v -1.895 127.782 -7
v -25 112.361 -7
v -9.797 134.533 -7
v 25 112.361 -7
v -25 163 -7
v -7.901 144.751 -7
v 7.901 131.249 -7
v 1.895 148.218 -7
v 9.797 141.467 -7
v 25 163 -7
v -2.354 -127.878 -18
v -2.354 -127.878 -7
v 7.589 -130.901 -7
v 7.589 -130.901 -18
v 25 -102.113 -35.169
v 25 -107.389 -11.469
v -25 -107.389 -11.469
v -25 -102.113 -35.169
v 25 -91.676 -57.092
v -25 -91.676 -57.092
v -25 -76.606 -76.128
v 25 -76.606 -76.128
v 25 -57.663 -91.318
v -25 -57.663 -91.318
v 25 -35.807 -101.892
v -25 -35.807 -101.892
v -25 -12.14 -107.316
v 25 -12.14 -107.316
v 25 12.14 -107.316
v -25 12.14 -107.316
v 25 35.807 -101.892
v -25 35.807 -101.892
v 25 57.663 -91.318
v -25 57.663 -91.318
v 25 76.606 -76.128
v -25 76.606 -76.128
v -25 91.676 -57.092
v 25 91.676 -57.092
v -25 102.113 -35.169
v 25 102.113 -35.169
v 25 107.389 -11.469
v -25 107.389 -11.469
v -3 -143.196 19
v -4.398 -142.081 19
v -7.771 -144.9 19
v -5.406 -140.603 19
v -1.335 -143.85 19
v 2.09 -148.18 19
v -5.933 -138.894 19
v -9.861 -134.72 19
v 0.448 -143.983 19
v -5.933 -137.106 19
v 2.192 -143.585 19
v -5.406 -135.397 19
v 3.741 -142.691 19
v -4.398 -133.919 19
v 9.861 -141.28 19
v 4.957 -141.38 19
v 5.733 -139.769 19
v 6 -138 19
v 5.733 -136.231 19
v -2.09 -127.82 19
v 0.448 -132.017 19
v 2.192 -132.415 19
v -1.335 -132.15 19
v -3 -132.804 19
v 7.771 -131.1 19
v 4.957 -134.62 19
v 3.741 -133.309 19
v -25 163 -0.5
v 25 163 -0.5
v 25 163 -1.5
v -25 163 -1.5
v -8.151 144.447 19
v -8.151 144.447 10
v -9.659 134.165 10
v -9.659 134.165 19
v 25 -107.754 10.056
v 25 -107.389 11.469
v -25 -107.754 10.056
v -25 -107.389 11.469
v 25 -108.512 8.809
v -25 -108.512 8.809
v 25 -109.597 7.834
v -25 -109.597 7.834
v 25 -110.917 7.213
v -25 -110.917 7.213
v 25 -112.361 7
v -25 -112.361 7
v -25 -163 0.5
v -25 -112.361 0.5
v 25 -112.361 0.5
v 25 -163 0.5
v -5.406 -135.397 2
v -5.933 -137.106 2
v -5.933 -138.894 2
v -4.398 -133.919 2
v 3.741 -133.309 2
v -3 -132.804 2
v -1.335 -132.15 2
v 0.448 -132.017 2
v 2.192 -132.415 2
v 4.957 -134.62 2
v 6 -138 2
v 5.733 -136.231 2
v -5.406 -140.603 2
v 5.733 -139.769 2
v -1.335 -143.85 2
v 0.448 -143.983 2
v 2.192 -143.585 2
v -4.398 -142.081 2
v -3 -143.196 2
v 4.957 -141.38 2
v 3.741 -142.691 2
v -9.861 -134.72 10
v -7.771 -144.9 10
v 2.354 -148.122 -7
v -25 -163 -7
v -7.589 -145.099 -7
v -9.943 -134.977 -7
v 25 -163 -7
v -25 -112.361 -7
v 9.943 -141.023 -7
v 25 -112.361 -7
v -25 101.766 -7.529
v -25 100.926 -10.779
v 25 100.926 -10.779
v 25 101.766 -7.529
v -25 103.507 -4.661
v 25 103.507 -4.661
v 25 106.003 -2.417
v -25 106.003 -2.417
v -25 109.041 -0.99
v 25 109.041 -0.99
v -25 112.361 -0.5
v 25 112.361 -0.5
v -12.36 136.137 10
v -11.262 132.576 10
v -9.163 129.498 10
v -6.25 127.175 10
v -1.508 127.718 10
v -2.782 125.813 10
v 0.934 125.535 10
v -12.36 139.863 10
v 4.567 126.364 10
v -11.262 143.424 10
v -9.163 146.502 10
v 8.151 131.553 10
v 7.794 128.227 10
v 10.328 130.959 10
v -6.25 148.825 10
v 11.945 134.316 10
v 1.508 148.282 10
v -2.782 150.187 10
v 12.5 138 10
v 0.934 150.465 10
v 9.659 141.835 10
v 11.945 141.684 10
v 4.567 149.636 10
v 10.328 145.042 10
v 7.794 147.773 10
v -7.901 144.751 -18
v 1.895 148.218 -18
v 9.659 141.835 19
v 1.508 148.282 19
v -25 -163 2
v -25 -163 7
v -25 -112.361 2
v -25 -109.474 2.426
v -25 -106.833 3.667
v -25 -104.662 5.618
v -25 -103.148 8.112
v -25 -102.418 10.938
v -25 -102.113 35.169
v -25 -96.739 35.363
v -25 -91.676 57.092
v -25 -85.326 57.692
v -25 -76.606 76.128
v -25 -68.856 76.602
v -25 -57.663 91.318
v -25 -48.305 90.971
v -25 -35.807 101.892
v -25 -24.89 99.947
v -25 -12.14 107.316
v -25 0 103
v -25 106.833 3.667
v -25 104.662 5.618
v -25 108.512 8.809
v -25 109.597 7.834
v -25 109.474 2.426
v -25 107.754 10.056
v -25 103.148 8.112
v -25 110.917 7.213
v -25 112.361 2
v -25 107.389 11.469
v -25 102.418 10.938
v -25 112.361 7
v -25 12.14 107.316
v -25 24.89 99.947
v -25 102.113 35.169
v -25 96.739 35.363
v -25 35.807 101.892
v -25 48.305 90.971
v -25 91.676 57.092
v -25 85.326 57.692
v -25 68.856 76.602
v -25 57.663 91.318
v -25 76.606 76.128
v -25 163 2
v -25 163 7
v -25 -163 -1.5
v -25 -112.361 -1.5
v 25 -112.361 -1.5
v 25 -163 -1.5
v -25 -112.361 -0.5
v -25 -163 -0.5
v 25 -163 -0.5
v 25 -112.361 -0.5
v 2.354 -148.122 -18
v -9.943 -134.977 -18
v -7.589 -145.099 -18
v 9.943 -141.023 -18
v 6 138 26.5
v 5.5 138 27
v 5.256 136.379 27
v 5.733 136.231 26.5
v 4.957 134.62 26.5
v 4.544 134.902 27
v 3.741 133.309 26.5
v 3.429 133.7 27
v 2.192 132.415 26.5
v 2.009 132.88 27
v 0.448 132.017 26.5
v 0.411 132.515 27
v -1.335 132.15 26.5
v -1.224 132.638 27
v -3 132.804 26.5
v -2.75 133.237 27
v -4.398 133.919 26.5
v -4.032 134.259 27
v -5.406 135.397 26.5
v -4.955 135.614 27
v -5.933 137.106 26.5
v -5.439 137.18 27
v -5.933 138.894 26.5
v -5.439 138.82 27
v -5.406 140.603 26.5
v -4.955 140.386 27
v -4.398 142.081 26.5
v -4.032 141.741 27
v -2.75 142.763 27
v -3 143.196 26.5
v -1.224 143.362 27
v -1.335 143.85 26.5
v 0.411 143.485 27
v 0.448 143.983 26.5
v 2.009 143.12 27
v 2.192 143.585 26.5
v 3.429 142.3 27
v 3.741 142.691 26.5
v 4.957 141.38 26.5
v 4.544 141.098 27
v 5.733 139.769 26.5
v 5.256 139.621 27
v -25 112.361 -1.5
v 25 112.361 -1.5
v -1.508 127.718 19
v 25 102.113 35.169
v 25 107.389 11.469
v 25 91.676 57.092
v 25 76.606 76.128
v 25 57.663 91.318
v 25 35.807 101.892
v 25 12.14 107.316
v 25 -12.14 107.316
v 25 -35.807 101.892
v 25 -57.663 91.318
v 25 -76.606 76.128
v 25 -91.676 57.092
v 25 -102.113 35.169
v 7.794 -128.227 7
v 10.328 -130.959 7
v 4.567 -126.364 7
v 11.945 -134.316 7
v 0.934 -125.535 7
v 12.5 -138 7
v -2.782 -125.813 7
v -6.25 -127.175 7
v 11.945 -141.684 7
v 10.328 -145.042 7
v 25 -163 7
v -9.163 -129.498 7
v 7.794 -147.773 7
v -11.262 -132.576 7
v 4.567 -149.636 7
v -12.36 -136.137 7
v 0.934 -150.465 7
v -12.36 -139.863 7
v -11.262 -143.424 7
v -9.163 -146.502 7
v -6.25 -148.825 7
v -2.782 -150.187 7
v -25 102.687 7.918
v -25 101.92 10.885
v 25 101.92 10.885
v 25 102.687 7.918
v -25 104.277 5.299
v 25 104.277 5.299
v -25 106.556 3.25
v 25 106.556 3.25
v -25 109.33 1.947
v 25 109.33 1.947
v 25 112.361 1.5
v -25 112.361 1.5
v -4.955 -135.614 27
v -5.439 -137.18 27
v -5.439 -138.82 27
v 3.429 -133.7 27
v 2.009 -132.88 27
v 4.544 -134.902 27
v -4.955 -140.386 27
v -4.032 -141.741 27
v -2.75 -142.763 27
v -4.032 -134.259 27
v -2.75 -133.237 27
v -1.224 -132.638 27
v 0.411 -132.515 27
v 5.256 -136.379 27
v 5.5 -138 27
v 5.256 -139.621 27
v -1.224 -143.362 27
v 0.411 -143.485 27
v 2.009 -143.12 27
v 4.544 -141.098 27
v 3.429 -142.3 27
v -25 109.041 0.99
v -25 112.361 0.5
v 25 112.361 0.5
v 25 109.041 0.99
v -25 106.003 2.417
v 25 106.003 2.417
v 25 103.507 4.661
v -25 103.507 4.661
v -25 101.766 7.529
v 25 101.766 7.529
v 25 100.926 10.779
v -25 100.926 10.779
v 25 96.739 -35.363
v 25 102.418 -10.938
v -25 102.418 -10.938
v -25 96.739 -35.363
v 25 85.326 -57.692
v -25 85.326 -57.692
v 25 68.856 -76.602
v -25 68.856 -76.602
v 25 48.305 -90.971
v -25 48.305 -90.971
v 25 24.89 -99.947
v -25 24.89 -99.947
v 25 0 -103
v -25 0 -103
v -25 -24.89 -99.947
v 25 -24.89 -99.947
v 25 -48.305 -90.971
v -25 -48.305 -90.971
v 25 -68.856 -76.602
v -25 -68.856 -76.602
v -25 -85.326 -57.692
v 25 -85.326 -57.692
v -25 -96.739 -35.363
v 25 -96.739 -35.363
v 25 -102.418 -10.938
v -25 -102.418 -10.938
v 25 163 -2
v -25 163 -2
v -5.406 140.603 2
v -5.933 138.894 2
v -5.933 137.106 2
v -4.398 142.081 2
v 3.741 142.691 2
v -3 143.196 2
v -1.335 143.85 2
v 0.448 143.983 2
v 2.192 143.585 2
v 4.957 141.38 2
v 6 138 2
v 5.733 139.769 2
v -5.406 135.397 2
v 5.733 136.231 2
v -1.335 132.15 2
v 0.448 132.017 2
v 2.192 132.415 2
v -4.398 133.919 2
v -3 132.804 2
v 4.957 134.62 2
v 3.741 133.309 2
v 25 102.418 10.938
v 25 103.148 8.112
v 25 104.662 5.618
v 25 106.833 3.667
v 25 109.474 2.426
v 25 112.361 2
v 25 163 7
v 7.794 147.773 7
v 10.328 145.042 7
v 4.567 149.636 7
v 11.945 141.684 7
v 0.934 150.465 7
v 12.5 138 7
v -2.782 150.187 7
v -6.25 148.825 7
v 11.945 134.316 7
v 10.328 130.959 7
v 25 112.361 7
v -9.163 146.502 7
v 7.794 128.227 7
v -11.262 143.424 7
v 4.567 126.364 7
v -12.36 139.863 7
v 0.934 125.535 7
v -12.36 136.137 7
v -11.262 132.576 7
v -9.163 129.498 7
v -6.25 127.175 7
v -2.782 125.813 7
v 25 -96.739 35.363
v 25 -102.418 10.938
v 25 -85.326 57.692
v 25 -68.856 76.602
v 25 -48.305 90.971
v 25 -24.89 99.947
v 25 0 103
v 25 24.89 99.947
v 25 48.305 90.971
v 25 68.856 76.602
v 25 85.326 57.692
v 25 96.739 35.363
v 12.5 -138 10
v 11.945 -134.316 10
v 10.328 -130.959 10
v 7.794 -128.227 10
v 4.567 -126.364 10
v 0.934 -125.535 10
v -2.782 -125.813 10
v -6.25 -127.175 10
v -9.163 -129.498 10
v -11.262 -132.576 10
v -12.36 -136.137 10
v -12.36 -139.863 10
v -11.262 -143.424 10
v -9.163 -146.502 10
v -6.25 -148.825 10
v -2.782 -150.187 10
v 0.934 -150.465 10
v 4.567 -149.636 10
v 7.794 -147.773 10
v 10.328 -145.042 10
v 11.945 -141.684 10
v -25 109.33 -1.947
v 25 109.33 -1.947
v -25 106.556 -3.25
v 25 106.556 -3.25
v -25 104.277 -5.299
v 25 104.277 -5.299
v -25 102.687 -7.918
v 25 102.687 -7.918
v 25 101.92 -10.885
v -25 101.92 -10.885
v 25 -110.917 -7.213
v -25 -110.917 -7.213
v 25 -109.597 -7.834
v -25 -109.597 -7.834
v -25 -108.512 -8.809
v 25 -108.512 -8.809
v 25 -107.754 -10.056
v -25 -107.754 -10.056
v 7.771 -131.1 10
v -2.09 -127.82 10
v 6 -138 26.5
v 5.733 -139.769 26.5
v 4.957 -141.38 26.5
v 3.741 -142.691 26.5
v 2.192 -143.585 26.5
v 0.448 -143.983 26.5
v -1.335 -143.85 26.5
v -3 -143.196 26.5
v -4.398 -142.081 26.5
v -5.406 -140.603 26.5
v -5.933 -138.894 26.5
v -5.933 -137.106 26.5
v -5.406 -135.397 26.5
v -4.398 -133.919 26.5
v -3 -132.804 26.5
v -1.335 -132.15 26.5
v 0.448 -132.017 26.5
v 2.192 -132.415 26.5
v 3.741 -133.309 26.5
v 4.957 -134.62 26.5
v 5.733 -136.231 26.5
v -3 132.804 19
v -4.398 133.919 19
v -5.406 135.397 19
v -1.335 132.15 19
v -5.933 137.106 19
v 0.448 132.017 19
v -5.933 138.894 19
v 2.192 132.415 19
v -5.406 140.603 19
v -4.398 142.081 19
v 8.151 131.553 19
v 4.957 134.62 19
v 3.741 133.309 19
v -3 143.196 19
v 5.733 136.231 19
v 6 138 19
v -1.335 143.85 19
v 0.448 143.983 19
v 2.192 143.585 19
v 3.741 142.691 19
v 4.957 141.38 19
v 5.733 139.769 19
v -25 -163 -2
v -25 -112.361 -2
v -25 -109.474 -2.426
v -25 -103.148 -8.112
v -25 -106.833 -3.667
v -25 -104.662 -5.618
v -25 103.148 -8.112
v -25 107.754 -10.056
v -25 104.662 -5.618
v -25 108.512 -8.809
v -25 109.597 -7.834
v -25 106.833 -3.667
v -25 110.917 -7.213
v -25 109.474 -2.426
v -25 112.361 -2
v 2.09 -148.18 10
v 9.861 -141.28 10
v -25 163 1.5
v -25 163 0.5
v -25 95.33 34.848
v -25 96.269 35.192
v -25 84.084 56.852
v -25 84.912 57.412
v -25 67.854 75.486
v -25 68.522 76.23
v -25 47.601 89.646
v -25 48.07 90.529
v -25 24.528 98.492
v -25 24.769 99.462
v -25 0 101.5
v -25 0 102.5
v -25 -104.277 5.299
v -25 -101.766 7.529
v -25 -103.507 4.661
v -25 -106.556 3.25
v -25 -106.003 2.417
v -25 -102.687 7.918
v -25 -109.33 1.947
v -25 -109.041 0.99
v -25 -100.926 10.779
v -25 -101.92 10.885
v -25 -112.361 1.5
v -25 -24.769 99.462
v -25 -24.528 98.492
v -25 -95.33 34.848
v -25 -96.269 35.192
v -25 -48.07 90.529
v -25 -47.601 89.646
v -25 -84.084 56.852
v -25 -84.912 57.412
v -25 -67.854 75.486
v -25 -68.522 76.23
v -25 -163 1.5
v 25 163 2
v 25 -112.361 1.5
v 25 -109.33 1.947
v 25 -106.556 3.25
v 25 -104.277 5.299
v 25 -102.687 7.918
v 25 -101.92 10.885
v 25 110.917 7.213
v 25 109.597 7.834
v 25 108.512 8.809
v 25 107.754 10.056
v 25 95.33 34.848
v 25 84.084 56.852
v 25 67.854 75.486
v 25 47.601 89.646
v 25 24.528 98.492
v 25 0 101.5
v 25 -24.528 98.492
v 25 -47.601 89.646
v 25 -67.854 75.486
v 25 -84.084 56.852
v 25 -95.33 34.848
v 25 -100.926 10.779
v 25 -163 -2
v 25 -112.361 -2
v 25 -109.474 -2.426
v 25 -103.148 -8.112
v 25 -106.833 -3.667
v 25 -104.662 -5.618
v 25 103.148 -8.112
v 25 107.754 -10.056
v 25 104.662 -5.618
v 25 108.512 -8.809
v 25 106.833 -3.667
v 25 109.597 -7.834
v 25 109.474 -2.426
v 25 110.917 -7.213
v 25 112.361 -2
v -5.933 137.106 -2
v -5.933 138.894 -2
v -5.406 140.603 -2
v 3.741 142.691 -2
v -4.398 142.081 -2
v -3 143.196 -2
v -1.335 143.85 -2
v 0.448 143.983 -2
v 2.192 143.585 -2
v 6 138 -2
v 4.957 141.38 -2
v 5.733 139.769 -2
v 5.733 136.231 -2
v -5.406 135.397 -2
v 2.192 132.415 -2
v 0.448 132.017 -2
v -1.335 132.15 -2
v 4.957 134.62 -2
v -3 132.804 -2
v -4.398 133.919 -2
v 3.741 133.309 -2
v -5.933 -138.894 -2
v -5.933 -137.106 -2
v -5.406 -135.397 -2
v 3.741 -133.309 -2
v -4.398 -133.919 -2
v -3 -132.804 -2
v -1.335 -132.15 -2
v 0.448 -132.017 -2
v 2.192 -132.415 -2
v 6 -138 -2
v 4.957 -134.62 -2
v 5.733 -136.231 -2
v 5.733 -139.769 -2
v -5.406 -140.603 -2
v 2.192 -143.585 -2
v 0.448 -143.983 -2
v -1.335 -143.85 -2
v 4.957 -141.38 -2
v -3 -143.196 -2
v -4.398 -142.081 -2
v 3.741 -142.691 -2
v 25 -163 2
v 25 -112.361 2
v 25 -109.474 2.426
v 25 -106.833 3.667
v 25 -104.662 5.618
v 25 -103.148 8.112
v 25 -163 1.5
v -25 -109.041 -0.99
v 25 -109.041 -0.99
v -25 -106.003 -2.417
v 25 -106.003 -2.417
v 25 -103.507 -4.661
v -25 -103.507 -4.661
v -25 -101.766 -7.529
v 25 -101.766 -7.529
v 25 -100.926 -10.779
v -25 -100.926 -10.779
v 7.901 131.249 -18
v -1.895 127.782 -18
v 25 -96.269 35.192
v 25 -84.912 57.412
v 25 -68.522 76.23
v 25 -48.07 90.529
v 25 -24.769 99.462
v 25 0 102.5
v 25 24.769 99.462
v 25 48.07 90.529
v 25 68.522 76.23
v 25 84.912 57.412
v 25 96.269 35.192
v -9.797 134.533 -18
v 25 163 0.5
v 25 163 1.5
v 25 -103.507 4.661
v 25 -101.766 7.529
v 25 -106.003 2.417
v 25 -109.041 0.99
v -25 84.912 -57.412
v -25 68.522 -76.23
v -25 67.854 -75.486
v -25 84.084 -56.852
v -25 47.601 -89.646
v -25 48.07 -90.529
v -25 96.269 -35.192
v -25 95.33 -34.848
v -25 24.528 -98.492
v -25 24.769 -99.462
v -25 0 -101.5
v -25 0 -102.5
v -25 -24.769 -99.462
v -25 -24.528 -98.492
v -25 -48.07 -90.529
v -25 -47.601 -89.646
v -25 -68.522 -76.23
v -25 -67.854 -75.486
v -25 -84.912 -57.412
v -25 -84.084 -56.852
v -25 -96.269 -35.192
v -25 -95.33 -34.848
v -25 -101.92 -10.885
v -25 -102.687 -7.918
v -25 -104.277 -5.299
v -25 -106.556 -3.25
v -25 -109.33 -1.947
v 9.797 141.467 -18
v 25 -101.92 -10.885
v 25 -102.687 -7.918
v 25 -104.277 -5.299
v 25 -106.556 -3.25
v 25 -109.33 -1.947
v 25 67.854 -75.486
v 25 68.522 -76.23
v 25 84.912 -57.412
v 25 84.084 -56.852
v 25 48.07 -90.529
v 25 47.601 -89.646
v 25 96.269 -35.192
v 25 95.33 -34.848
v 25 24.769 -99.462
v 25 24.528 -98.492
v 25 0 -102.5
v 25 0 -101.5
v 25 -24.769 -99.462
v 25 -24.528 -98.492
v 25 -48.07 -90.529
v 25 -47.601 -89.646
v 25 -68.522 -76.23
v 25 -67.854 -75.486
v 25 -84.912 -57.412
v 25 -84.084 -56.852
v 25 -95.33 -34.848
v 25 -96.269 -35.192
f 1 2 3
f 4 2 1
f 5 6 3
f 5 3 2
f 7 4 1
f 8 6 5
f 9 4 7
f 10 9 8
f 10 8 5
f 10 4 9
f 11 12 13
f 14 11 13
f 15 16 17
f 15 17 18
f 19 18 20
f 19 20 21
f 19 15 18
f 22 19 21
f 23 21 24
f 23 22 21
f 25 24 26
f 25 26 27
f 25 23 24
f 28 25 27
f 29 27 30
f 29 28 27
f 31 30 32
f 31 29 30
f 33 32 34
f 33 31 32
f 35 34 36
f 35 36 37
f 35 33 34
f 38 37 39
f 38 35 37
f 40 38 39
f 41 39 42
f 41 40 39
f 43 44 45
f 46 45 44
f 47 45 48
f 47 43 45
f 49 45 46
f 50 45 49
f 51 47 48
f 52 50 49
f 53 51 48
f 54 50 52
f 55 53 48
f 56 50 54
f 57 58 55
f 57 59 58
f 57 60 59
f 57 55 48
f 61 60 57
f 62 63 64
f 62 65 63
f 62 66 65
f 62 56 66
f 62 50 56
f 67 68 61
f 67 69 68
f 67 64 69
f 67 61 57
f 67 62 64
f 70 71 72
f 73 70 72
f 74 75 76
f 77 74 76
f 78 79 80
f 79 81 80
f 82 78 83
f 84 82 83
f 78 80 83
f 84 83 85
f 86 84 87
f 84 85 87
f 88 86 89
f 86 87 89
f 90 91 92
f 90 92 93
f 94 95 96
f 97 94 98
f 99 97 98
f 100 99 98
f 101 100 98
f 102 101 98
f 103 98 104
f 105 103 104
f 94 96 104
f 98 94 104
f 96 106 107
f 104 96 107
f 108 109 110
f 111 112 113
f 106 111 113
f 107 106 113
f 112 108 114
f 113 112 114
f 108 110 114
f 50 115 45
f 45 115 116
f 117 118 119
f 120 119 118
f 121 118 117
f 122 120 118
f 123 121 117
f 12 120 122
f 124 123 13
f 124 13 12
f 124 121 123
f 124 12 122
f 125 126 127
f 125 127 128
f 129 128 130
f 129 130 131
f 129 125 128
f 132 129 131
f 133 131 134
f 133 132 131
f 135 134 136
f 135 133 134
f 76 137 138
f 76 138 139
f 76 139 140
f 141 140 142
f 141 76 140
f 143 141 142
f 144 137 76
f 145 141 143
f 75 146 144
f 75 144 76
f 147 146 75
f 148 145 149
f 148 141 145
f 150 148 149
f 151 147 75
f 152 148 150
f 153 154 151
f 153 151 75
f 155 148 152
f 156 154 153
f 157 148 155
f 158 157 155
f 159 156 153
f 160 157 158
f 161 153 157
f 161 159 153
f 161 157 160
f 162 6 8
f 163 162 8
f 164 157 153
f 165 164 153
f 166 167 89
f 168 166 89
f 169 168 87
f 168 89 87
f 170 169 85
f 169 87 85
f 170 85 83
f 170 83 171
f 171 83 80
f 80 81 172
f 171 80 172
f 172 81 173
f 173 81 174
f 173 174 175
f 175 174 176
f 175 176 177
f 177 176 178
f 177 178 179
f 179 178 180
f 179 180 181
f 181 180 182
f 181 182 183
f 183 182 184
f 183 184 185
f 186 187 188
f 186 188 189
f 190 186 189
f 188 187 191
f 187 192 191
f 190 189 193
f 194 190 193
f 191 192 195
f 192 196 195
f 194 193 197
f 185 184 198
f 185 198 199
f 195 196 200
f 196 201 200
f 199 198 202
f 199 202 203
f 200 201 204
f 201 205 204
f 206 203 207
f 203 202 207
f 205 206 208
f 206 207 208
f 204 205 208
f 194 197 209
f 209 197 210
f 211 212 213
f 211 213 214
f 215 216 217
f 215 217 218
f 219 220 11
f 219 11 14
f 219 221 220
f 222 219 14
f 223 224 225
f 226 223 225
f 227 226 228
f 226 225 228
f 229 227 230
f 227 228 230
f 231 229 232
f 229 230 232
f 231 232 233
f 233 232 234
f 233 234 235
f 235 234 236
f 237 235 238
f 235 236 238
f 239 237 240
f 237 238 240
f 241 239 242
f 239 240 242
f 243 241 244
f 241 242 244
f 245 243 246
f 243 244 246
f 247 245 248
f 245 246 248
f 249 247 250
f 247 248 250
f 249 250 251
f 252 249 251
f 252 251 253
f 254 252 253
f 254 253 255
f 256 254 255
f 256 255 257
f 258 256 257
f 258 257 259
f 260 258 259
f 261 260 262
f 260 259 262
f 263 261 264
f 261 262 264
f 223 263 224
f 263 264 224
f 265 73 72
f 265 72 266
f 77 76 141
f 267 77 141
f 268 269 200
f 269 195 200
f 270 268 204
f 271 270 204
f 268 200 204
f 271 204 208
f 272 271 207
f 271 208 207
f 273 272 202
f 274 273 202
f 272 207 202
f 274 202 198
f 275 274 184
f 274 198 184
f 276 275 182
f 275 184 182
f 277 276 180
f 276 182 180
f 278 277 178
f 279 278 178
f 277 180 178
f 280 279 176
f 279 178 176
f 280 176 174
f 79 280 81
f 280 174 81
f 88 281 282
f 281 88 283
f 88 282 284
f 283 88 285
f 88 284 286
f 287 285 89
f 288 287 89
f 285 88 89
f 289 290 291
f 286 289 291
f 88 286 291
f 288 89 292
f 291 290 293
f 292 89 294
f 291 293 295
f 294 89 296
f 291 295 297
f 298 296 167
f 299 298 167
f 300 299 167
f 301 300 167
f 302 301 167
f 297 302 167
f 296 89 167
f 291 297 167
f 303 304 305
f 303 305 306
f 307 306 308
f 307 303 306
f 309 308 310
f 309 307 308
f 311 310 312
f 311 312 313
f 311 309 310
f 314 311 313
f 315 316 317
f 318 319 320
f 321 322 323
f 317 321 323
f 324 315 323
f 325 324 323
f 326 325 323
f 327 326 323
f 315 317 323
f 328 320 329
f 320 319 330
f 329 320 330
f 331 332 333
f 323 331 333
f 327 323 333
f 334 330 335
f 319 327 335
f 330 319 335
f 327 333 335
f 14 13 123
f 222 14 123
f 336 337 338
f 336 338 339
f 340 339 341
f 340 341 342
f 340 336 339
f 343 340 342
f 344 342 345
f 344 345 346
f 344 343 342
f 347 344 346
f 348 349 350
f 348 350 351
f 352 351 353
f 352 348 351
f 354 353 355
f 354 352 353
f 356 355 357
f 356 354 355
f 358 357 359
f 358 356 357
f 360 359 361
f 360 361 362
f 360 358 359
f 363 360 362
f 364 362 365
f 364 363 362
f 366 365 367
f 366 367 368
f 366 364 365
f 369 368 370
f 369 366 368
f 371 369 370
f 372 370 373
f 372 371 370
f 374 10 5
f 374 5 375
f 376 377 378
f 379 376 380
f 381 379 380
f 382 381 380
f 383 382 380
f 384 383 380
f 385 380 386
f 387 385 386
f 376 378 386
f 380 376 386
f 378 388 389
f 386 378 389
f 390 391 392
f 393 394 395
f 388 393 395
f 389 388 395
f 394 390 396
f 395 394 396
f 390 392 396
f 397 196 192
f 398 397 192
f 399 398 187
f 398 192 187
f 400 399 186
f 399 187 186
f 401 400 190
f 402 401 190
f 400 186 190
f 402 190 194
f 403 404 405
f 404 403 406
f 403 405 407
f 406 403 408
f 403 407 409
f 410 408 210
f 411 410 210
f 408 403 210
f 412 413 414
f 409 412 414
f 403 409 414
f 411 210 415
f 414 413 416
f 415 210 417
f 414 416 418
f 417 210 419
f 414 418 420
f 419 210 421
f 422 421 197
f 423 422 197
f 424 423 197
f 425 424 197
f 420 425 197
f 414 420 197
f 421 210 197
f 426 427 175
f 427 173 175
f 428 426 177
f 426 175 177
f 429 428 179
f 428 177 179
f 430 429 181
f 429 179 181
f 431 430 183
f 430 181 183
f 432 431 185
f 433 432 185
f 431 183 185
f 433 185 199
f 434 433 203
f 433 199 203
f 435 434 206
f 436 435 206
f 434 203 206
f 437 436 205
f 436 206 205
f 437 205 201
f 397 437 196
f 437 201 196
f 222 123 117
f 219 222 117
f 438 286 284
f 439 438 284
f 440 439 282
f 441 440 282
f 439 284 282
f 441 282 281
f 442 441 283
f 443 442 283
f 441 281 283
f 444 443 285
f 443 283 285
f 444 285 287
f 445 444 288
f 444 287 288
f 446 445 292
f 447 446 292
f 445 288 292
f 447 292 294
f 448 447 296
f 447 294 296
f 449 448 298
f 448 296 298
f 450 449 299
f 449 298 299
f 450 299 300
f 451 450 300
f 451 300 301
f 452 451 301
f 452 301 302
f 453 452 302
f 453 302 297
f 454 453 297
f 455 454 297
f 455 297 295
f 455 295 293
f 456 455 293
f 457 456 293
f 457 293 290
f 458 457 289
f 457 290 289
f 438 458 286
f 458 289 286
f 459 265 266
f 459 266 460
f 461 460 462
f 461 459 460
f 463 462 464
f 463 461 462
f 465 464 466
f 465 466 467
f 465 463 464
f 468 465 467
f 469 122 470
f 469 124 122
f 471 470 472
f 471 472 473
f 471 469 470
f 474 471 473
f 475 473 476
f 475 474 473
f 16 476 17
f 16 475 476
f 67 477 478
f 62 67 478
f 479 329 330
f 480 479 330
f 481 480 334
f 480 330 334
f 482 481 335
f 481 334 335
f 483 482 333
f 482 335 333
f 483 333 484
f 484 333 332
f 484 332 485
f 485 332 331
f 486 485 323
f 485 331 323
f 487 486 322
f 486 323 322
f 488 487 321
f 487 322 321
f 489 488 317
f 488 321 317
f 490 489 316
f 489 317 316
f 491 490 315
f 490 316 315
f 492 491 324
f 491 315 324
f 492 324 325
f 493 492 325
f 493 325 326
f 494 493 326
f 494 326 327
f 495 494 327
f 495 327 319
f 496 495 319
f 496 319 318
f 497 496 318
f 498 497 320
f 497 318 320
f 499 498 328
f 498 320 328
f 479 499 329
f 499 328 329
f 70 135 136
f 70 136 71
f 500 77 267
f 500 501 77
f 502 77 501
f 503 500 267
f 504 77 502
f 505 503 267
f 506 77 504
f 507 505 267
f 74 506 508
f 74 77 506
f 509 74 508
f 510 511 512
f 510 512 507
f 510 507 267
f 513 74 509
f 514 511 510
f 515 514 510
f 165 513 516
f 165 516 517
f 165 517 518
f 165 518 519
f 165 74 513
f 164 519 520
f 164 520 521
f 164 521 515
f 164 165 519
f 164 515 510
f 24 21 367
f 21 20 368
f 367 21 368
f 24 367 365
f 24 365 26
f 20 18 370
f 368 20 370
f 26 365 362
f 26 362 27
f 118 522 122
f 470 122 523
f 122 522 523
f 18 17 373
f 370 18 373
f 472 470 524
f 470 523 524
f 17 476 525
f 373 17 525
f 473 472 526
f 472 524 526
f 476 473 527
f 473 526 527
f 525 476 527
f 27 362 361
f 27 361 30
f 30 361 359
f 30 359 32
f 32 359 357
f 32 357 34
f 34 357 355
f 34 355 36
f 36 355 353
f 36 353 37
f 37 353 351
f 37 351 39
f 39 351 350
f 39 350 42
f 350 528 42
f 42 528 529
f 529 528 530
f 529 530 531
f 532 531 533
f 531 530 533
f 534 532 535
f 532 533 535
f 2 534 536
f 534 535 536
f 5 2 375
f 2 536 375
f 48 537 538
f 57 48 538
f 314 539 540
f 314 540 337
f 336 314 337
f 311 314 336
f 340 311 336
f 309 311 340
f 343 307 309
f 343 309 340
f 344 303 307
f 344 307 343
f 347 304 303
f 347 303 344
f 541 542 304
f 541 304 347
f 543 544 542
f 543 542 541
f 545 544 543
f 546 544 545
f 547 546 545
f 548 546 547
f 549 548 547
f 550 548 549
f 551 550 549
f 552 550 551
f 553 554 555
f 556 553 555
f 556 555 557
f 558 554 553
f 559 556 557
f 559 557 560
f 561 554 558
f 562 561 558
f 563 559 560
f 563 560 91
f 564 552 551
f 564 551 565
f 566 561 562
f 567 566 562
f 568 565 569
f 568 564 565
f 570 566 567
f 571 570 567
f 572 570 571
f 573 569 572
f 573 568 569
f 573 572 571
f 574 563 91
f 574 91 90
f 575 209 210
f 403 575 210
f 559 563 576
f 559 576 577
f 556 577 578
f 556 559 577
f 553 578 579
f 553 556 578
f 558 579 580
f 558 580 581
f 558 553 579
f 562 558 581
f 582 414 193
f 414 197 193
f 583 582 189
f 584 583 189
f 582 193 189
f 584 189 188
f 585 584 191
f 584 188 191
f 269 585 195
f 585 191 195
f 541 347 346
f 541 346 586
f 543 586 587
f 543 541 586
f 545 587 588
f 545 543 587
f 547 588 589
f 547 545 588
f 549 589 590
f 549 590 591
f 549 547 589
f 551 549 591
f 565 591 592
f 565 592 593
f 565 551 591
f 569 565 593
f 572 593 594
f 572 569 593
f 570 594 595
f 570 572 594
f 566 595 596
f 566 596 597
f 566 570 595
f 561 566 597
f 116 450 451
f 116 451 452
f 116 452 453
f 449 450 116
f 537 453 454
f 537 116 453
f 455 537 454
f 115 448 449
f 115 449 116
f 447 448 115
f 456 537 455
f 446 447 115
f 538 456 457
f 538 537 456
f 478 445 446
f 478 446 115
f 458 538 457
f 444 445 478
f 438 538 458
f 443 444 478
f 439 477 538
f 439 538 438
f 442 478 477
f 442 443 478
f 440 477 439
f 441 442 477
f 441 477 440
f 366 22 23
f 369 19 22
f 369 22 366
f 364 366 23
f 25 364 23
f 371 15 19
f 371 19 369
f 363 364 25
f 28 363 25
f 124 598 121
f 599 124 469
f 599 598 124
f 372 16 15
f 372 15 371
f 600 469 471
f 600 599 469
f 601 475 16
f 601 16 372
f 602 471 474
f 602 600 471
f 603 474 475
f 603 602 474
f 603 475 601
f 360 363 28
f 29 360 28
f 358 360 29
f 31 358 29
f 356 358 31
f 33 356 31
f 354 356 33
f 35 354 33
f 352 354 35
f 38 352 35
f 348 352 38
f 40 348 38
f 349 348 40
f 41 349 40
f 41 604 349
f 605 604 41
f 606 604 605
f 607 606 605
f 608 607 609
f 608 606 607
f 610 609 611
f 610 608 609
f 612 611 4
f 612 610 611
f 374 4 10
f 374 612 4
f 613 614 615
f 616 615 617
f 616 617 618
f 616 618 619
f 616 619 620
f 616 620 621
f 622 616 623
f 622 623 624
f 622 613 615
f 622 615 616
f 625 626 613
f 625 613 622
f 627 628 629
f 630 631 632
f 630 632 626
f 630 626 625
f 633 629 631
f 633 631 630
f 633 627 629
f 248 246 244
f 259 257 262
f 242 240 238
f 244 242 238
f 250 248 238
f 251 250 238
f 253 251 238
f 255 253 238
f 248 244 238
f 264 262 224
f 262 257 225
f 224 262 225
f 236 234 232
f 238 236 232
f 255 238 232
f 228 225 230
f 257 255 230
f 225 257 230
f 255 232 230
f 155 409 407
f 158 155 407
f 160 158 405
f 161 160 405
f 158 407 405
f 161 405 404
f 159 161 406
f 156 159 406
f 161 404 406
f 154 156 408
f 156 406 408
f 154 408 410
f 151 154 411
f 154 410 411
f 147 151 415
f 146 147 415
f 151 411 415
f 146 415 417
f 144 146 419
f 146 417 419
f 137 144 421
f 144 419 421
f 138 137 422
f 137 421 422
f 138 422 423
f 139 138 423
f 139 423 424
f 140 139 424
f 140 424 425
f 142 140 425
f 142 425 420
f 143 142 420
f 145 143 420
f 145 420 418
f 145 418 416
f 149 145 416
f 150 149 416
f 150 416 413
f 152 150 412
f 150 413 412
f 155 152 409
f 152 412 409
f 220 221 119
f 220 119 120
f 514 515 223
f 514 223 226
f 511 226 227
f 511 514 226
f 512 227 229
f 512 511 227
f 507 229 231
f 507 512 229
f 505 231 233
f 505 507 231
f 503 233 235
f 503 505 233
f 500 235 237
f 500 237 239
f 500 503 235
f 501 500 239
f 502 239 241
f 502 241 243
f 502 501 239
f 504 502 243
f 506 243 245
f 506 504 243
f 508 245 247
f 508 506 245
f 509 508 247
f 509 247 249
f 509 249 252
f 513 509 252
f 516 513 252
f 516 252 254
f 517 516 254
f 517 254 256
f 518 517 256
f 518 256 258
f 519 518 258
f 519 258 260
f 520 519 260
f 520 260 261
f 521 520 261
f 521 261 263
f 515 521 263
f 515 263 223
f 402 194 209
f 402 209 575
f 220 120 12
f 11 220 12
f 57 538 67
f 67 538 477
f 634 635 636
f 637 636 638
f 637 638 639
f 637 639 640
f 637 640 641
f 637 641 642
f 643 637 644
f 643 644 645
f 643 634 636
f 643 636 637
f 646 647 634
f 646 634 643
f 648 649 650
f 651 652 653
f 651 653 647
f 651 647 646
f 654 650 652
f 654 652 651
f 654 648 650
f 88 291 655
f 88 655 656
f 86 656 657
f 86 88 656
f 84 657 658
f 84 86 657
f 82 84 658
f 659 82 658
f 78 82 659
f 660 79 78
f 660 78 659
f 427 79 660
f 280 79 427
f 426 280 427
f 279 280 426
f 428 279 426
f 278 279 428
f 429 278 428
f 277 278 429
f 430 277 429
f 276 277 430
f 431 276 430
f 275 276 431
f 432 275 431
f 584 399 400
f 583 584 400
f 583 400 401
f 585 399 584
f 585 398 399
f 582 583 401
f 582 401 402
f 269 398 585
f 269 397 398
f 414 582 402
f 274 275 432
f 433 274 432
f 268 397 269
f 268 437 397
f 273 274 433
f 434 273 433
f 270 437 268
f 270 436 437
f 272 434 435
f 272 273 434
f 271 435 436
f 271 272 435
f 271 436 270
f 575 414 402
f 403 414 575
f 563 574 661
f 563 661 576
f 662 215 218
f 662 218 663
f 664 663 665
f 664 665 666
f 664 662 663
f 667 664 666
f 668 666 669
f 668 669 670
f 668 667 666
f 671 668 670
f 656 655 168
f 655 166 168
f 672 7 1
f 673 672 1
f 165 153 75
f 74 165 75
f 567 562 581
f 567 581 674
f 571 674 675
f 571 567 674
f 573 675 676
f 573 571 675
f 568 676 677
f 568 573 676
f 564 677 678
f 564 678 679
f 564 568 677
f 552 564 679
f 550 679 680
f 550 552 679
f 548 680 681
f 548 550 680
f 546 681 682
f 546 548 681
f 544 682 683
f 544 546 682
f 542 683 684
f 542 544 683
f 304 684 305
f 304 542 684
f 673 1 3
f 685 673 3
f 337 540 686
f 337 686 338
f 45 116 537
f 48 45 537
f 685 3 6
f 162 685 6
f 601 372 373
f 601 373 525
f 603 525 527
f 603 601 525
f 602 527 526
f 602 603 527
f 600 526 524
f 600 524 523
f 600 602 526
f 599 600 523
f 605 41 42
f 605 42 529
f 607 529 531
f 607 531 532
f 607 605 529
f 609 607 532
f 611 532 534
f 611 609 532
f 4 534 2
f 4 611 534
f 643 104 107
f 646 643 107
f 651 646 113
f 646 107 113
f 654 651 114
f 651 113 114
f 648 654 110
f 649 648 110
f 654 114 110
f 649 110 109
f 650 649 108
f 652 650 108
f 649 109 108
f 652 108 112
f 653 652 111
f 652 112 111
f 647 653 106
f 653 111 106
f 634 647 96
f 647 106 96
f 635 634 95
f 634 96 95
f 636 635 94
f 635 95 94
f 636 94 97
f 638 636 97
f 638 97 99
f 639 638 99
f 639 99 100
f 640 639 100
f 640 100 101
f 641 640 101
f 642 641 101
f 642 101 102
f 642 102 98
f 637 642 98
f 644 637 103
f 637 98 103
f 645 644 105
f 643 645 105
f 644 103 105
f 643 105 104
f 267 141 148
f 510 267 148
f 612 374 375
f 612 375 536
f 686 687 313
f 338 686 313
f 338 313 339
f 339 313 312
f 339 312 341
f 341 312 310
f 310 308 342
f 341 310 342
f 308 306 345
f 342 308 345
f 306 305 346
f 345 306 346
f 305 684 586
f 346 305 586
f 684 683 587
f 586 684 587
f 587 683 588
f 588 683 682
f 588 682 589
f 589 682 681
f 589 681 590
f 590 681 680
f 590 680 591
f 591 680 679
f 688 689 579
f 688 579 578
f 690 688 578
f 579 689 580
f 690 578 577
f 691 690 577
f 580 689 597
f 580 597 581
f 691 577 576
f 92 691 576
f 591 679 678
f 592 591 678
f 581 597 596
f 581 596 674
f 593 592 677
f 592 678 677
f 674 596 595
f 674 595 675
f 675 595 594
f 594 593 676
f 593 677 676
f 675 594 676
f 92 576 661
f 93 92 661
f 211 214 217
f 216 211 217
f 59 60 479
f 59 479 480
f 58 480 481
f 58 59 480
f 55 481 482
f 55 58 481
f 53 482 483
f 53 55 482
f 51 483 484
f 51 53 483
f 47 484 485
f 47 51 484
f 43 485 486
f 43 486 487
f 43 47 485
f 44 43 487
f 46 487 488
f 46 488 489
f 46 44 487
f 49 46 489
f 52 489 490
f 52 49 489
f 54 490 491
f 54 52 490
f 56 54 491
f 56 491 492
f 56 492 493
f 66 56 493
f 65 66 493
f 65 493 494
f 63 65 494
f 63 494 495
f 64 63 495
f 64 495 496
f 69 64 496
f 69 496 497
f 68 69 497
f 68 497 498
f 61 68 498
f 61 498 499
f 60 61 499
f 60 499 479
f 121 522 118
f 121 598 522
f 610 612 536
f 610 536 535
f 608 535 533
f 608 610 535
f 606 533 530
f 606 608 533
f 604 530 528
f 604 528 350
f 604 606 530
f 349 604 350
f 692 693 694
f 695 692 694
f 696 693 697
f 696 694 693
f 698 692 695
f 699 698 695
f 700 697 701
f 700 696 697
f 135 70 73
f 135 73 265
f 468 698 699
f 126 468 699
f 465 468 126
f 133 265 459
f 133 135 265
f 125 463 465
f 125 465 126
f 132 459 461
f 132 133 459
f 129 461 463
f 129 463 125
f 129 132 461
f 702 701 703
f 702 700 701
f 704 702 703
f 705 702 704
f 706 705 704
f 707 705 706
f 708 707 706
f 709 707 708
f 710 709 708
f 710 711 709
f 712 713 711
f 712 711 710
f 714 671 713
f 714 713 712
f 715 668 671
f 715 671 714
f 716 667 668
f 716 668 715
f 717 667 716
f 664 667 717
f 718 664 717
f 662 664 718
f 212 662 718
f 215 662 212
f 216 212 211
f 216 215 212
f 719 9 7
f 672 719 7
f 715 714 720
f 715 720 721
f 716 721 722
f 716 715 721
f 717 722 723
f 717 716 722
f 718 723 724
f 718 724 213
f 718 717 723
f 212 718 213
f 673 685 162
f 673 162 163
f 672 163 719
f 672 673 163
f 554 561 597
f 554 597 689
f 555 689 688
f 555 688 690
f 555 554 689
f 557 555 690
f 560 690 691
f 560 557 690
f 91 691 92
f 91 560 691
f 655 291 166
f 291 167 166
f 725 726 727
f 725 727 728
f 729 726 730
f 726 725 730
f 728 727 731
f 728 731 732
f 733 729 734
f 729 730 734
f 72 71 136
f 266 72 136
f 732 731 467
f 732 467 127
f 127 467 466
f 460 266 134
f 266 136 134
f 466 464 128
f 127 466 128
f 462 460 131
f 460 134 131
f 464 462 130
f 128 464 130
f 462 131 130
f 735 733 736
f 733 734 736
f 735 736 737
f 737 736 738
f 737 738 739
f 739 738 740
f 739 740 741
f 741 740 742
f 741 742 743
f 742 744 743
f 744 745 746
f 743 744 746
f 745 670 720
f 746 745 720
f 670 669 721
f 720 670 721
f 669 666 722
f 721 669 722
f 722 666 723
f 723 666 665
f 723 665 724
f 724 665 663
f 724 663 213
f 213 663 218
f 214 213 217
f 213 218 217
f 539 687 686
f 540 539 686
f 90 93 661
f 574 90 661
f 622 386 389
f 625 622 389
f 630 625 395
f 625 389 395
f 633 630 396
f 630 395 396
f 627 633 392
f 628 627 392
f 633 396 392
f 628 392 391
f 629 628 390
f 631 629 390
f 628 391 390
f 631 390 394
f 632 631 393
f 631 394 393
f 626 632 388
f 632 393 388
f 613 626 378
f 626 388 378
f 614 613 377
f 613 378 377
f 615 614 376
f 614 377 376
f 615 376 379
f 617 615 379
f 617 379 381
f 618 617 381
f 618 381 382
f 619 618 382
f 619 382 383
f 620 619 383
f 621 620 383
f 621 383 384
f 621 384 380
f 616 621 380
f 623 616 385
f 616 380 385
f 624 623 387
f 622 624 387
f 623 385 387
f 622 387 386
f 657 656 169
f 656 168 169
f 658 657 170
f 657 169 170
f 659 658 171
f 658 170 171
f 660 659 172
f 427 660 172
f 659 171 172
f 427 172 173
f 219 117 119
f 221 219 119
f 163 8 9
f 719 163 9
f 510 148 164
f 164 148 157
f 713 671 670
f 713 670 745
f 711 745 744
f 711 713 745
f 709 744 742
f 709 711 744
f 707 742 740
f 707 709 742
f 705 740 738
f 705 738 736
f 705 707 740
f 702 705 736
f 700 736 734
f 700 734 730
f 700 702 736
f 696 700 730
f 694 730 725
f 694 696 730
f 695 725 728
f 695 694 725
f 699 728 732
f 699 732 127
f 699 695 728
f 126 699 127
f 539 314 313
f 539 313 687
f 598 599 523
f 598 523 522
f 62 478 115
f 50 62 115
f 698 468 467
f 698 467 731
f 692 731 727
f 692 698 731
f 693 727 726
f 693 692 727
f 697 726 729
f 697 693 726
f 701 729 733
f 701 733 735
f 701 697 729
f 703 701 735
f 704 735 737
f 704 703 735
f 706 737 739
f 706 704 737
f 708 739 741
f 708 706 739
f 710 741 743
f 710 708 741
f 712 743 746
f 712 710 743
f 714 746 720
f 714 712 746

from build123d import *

# Parameters (mm, degrees)
F1_DEPTH  = 25
F2_R      = 6
F3_DEPTH  = 12
F2_R_2    = 12.5
F4_DEPTH  = 3
F5_R      = 6
F6_DEPTH  = 25
F7_R      = 6
F8_DEPTH  = 11
F8_FACE_R = 6
F9_DEPTH  = 11
F10_R     = 6
F11_DEPTH = 3.999998
F13_DEPTH = 50
F14_SIZE  = 0.5


with BuildPart() as f1:
    # F0 (on Right) → F1 (new body, symmetric)
    with BuildSketch(Plane.YZ):
        with BuildLine():
            Line((163.000013, 1.999999), (163.000013, 7))
            Line((163.000013, 7), (112.361038, 7))
            ThreePointArc((112.361038, 7), (109.018499, 8.281474), (107.389311, 11.469027))
            ThreePointArc((107.389311, 11.469027), (0, 108.000013), (-107.389311, 11.469027))
            ThreePointArc((-107.389311, 11.469027), (-109.018499, 8.281474), (-112.361038, 7))
            Line((-112.361038, 7), (-163.000013, 7))
            Line((-163.000013, 7), (-163.000013, 1.999999))
            Line((-163.000013, 1.999999), (-112.361025, 1.999999))
            ThreePointArc((-112.361025, 1.999999), (-105.675948, 4.562948), (-102.417572, 10.938052))
            ThreePointArc((-102.417572, 10.938052), (0, 103), (102.417572, 10.938052))
            ThreePointArc((102.417572, 10.938052), (105.675948, 4.562948), (112.361025, 1.999999))
            Line((112.361025, 1.999999), (163.000013, 1.999999))
        make_face()
        with BuildLine():
            ThreePointArc((-112.361038, -7), (-109.018499, -8.281474), (-107.389311, -11.469027))
            ThreePointArc((-107.389311, -11.469027), (0, -108.000013), (107.389311, -11.469027))
            ThreePointArc((107.389311, -11.469027), (109.018499, -8.281474), (112.361038, -7))
            Line((112.361038, -7), (163.000013, -7))
            Line((163.000013, -7), (163.000013, -1.999999))
            Line((163.000013, -1.999999), (112.361025, -1.999999))
            ThreePointArc((112.361025, -1.999999), (105.675948, -4.562948), (102.417572, -10.938052))
            ThreePointArc((102.417572, -10.938052), (0, -103), (-102.417572, -10.938052))
            ThreePointArc((-102.417572, -10.938052), (-105.675948, -4.562948), (-112.361025, -1.999999))
            Line((-112.361025, -1.999999), (-163.000013, -1.999999))
            Line((-163.000013, -1.999999), (-163.000013, -7))
            Line((-163.000013, -7), (-112.361038, -7))
        make_face()
    extrude(amount=F1_DEPTH, both=True)

    # F2 (on face) → F3 (join)
    with BuildSketch(Plane.XY.offset(7)):
        Polygon((-9.860961, -134.719549), (-7.771445, -144.899624), (2.089516, -148.180087), (9.860961, -141.280476), (7.771445, -131.100401), (-2.089516, -127.819938), align=None)
        with Locations((0, -138.000013)):
            Circle(F2_R, mode=Mode.SUBTRACT)
        Polygon((-9.658712, 134.164745), (-1.507917, 127.717689), (8.150795, 131.552956), (9.658712, 141.83528), (1.507917, 148.282336), (-8.150795, 144.447069), align=None)
        with Locations((0, 138.000013)):
            Circle(F2_R, mode=Mode.SUBTRACT)
        with Locations((0, 138.000013)):
            Circle(F2_R)
    extrude(amount=F3_DEPTH)

    # F2 (on face) → F4 (join)
    with BuildSketch(Plane.XY.offset(7)):
        with Locations((0, -138.000013)):
            Circle(F2_R_2)
        Polygon((2.089516, -148.180087), (-7.771445, -144.899624), (-9.860961, -134.719549), (-2.089516, -127.819938), (7.771445, -131.100401), (9.860961, -141.280476), align=None, mode=Mode.SUBTRACT)
        with Locations((0, 138.000013)):
            Circle(F2_R_2)
        Polygon((8.150795, 131.552956), (-1.507917, 127.717689), (-9.658712, 134.164745), (-8.150795, 144.447069), (1.507917, 148.282336), (9.658712, 141.83528), align=None, mode=Mode.SUBTRACT)
    extrude(amount=F4_DEPTH)

    # F5 (on face) → F6 (join)
    with BuildSketch(Plane(origin=(0, 0, 1.999999), x_dir=(1, 0, 0), z_dir=(0, 0, -1))):
        with Locations((0, -138.000013)):
            Circle(F5_R)
        with Locations((0, 138.000013)):
            Circle(F5_R)
    extrude(amount=-F6_DEPTH)

    # F7 (on face) → F8 (join)
    with BuildSketch(Plane(origin=(0, 0, -7), x_dir=(1, 0, 0), z_dir=(0, 0, -1))):
        Polygon((9.796769, -141.467479), (7.901298, -131.249495), (-1.89547, -127.782029), (-9.796769, -134.532546), (-7.901298, -144.75053), (1.89547, -148.217996), align=None)
        with Locations((0, -138.000013)):
            Circle(F7_R, mode=Mode.SUBTRACT)
        Polygon((-9.94295, 134.977141), (-2.353591, 127.87773), (7.589359, 130.900602), (9.94295, 141.022884), (2.353591, 148.122295), (-7.589359, 145.099424), align=None)
        with Locations((0, 138.000013)):
            Circle(F7_R, mode=Mode.SUBTRACT)
    extrude(amount=F8_DEPTH)

    # F8_face (on face) → F9 (join, through all)
    with BuildSketch(Plane(origin=(0, -138.000013, -7), x_dir=(1, 0, 0), z_dir=(0, 0, -1))):
        Circle(F8_FACE_R)
        with Locations((0, -276.000025)):
            Circle(F8_FACE_R)
    extrude(amount=F9_DEPTH)

    # F14
    f14_edges = [f1.edges().sort_by_distance(p)[0] for p in [
        (-6, -138.000013, 26.999999),
        (-6, 138.000013, 26.999999),
    ]]
    chamfer(f14_edges, length=F14_SIZE)


with BuildPart() as f11:
    # F10 (on face) → F11 (new body, through all)
    with BuildSketch(Plane(origin=(0, 0, 1.999999), x_dir=(1, 0, 0), z_dir=(0, 0, -1))):
        with Locations((0, -138.000013)):
            Circle(F10_R)
        with Locations((0, 138.000013)):
            Circle(F10_R)
    extrude(amount=F11_DEPTH)


with BuildPart() as f13:
    # F12 (on face) → F13 (new body, through all)
    with BuildSketch(Plane(origin=(-25, 0, 0), x_dir=(0, -1, 0), z_dir=(-1, 0, 0))):
        with BuildLine():
            Line((163.000013, 1.499999), (112.361025, 1.499999))
            ThreePointArc((112.361025, 1.499999), (105.341694, 4.191095), (101.920399, 10.884955))
            ThreePointArc((101.920399, 10.884955), (0, 102.5), (-101.920399, 10.884955))
            ThreePointArc((-101.920399, 10.884955), (-105.341694, 4.191095), (-112.361025, 1.499999))
            Line((-112.361025, 1.499999), (-163.000013, 1.499999))
            Line((-163.000013, 1.499999), (-163.000013, 0.499999))
            Line((-163.000013, 0.499999), (-112.361025, 0.499999))
            ThreePointArc((-112.361025, 0.499999), (-104.673186, 3.44739), (-100.926054, 10.77876))
            ThreePointArc((-100.926054, 10.77876), (0, 101.5), (100.926054, 10.77876))
            ThreePointArc((100.926054, 10.77876), (104.673186, 3.44739), (112.361025, 0.499999))
            Line((112.361025, 0.499999), (163.000013, 0.499999))
            Line((163.000013, 0.499999), (163.000013, 1.499999))
        make_face()
        with BuildLine():
            ThreePointArc((101.920399, -10.884955), (105.341694, -4.191095), (112.361025, -1.499999))
            Line((112.361025, -1.499999), (163.000013, -1.499999))
            Line((163.000013, -1.499999), (163.000013, -0.499999))
            Line((163.000013, -0.499999), (112.361025, -0.499999))
            ThreePointArc((112.361025, -0.499999), (104.673186, -3.44739), (100.926054, -10.77876))
            ThreePointArc((100.926054, -10.77876), (0, -101.5), (-100.926054, -10.77876))
            ThreePointArc((-100.926054, -10.77876), (-104.673186, -3.44739), (-112.361025, -0.499999))
            Line((-112.361025, -0.499999), (-163.000013, -0.499999))
            Line((-163.000013, -0.499999), (-163.000013, -1.499999))
            Line((-163.000013, -1.499999), (-112.361025, -1.499999))
            ThreePointArc((-112.361025, -1.499999), (-105.341694, -4.191095), (-101.920399, -10.884955))
            ThreePointArc((-101.920399, -10.884955), (0, -102.5), (101.920399, -10.884955))
        make_face()
    extrude(amount=-F13_DEPTH)


solid = Compound([f1.part, f11.part, f13.part])
